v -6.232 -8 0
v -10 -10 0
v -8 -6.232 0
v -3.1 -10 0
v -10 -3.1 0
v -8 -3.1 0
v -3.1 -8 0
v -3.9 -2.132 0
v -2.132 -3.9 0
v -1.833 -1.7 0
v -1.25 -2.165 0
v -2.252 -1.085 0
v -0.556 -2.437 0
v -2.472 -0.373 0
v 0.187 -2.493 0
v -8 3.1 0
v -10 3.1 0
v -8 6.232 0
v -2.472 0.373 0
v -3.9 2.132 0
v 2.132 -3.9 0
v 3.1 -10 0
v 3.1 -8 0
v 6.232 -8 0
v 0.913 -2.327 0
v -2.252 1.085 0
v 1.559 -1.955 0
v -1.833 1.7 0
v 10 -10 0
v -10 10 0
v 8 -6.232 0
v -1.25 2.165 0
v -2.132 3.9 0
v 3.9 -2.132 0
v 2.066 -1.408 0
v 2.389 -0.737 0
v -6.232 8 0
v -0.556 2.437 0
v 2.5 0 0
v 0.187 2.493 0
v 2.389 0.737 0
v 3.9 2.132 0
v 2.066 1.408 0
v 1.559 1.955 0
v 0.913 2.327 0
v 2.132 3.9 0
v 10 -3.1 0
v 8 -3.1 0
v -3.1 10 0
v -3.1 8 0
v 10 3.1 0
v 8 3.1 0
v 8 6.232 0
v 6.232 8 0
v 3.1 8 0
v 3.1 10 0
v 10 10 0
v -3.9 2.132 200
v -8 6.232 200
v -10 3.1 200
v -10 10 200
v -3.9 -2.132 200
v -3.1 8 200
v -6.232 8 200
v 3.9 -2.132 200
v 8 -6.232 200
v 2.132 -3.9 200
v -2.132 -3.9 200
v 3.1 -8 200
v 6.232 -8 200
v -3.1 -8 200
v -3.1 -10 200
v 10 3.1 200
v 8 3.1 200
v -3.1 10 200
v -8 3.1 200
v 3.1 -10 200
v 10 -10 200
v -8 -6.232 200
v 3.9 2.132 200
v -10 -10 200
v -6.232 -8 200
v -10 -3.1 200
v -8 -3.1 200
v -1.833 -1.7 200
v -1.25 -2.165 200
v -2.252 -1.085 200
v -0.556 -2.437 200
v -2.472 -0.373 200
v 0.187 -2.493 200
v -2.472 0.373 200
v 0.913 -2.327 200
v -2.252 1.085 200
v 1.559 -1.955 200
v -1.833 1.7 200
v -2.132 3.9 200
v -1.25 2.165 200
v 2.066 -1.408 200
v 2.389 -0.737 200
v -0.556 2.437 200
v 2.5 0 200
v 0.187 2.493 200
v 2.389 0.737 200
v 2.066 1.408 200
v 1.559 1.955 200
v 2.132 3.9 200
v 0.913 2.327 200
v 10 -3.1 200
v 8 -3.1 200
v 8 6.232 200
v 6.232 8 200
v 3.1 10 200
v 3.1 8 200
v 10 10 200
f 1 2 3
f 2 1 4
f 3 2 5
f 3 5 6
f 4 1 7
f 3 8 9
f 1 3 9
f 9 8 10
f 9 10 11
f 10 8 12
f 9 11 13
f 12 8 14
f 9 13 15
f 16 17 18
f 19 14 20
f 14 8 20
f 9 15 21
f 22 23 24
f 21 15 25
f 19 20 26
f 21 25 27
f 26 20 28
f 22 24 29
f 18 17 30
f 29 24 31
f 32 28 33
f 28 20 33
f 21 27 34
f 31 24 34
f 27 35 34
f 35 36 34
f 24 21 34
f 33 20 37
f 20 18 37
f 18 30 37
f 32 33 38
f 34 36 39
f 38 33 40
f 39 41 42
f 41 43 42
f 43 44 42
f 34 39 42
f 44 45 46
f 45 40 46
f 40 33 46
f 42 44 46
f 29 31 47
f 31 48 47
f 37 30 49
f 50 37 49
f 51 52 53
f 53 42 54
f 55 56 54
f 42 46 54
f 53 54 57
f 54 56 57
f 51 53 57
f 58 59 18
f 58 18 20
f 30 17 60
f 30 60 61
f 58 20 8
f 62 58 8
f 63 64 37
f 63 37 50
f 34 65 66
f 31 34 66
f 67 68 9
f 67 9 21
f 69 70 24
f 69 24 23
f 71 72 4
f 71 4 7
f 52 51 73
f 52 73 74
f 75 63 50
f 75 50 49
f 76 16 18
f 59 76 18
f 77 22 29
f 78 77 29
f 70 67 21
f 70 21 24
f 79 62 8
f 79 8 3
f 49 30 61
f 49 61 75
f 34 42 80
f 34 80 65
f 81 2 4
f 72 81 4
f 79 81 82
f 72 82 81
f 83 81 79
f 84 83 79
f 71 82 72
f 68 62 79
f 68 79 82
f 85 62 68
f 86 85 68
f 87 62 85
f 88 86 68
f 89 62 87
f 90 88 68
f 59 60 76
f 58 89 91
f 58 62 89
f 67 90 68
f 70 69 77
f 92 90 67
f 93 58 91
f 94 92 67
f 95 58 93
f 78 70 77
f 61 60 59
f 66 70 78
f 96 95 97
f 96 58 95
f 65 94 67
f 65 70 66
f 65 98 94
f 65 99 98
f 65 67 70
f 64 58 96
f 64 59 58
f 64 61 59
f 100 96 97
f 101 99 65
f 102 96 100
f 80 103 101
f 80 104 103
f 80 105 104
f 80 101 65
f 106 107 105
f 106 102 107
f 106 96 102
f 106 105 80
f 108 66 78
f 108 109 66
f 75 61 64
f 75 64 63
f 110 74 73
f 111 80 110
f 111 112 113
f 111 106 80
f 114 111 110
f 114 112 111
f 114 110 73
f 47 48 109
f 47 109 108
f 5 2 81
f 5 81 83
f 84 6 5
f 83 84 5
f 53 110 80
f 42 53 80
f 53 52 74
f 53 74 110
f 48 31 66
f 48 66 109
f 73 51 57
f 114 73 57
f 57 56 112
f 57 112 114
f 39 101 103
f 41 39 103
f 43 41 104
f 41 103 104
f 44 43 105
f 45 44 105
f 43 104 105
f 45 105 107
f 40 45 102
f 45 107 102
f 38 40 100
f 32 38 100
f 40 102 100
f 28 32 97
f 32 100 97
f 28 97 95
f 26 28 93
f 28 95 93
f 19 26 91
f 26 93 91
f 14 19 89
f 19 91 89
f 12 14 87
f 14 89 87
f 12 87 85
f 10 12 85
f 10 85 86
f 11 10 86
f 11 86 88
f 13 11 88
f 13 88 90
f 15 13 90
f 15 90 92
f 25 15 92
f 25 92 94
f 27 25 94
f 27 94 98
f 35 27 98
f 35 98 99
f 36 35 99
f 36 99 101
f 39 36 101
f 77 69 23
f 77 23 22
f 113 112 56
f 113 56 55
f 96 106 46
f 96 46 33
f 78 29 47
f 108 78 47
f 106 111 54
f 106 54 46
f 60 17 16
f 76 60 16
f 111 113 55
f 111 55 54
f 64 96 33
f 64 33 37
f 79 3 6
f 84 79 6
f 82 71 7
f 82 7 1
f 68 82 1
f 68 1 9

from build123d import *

# Parameters (mm, degrees)
SKETCH_W        = 20
SKETCH_H        = 20
PAD_DEPTH       = 300
SKETCH001_R     = 2.5
POCKET_DEPTH    = 300.001
POCKET001_DEPTH = 300.001
SKETCH003_W     = 20
SKETCH003_H     = 20
POCKET002_DEPTH = 100


with BuildPart() as part:
    # Sketch → Pad (new body)
    with BuildSketch(Plane.XY):
        Rectangle(SKETCH_W, SKETCH_H)
    extrude(amount=PAD_DEPTH)

    # Sketch001 (on Face6 of Pad) → Pocket (cut, through all)
    with BuildSketch(Plane.XY.offset(300)):
        Circle(SKETCH001_R)
        Polygon((-3.1, 10), (3.1, 10), (3.1, 8), (6.232233, 8), (2.132233, 3.9), (-2.132233, 3.9), (-6.232233, 8), (-3.1, 8), align=None)
        Polygon((-3.1, -8), (-6.232233, -8), (-2.132233, -3.9), (2.132233, -3.9), (6.232233, -8), (3.1, -8), (3.1, -10), (-3.1, -10), align=None)
    extrude(amount=-POCKET_DEPTH, mode=Mode.SUBTRACT)

    # Sketch002 (on Face2 of Pocket) → Pocket001 (cut, through all)
    with BuildSketch(Plane(origin=(0, 0, 0), x_dir=(1, 0, 0), z_dir=(0, 0, -1))):
        Polygon((-10, -3.1), (-8, -3.1), (-8, -6.232233), (-3.9, -2.132233), (-3.9, 2.132233), (-8, 6.232233), (-8, 3.1), (-10, 3.1), align=None)
        Polygon((3.9, -2.132233), (3.9, 2.132233), (8, 6.232233), (8, 3.1), (10, 3.1), (10, -3.1), (8, -3.1), (8, -6.232233), align=None)
    extrude(amount=-POCKET001_DEPTH, mode=Mode.SUBTRACT)

    # Sketch003 (on Face4 of Clone) → Pocket002 (cut)
    with BuildSketch(Plane.XY.offset(300)):
        Rectangle(SKETCH003_W, SKETCH003_H)
    extrude(amount=-POCKET002_DEPTH, mode=Mode.SUBTRACT)


solid = part.part
